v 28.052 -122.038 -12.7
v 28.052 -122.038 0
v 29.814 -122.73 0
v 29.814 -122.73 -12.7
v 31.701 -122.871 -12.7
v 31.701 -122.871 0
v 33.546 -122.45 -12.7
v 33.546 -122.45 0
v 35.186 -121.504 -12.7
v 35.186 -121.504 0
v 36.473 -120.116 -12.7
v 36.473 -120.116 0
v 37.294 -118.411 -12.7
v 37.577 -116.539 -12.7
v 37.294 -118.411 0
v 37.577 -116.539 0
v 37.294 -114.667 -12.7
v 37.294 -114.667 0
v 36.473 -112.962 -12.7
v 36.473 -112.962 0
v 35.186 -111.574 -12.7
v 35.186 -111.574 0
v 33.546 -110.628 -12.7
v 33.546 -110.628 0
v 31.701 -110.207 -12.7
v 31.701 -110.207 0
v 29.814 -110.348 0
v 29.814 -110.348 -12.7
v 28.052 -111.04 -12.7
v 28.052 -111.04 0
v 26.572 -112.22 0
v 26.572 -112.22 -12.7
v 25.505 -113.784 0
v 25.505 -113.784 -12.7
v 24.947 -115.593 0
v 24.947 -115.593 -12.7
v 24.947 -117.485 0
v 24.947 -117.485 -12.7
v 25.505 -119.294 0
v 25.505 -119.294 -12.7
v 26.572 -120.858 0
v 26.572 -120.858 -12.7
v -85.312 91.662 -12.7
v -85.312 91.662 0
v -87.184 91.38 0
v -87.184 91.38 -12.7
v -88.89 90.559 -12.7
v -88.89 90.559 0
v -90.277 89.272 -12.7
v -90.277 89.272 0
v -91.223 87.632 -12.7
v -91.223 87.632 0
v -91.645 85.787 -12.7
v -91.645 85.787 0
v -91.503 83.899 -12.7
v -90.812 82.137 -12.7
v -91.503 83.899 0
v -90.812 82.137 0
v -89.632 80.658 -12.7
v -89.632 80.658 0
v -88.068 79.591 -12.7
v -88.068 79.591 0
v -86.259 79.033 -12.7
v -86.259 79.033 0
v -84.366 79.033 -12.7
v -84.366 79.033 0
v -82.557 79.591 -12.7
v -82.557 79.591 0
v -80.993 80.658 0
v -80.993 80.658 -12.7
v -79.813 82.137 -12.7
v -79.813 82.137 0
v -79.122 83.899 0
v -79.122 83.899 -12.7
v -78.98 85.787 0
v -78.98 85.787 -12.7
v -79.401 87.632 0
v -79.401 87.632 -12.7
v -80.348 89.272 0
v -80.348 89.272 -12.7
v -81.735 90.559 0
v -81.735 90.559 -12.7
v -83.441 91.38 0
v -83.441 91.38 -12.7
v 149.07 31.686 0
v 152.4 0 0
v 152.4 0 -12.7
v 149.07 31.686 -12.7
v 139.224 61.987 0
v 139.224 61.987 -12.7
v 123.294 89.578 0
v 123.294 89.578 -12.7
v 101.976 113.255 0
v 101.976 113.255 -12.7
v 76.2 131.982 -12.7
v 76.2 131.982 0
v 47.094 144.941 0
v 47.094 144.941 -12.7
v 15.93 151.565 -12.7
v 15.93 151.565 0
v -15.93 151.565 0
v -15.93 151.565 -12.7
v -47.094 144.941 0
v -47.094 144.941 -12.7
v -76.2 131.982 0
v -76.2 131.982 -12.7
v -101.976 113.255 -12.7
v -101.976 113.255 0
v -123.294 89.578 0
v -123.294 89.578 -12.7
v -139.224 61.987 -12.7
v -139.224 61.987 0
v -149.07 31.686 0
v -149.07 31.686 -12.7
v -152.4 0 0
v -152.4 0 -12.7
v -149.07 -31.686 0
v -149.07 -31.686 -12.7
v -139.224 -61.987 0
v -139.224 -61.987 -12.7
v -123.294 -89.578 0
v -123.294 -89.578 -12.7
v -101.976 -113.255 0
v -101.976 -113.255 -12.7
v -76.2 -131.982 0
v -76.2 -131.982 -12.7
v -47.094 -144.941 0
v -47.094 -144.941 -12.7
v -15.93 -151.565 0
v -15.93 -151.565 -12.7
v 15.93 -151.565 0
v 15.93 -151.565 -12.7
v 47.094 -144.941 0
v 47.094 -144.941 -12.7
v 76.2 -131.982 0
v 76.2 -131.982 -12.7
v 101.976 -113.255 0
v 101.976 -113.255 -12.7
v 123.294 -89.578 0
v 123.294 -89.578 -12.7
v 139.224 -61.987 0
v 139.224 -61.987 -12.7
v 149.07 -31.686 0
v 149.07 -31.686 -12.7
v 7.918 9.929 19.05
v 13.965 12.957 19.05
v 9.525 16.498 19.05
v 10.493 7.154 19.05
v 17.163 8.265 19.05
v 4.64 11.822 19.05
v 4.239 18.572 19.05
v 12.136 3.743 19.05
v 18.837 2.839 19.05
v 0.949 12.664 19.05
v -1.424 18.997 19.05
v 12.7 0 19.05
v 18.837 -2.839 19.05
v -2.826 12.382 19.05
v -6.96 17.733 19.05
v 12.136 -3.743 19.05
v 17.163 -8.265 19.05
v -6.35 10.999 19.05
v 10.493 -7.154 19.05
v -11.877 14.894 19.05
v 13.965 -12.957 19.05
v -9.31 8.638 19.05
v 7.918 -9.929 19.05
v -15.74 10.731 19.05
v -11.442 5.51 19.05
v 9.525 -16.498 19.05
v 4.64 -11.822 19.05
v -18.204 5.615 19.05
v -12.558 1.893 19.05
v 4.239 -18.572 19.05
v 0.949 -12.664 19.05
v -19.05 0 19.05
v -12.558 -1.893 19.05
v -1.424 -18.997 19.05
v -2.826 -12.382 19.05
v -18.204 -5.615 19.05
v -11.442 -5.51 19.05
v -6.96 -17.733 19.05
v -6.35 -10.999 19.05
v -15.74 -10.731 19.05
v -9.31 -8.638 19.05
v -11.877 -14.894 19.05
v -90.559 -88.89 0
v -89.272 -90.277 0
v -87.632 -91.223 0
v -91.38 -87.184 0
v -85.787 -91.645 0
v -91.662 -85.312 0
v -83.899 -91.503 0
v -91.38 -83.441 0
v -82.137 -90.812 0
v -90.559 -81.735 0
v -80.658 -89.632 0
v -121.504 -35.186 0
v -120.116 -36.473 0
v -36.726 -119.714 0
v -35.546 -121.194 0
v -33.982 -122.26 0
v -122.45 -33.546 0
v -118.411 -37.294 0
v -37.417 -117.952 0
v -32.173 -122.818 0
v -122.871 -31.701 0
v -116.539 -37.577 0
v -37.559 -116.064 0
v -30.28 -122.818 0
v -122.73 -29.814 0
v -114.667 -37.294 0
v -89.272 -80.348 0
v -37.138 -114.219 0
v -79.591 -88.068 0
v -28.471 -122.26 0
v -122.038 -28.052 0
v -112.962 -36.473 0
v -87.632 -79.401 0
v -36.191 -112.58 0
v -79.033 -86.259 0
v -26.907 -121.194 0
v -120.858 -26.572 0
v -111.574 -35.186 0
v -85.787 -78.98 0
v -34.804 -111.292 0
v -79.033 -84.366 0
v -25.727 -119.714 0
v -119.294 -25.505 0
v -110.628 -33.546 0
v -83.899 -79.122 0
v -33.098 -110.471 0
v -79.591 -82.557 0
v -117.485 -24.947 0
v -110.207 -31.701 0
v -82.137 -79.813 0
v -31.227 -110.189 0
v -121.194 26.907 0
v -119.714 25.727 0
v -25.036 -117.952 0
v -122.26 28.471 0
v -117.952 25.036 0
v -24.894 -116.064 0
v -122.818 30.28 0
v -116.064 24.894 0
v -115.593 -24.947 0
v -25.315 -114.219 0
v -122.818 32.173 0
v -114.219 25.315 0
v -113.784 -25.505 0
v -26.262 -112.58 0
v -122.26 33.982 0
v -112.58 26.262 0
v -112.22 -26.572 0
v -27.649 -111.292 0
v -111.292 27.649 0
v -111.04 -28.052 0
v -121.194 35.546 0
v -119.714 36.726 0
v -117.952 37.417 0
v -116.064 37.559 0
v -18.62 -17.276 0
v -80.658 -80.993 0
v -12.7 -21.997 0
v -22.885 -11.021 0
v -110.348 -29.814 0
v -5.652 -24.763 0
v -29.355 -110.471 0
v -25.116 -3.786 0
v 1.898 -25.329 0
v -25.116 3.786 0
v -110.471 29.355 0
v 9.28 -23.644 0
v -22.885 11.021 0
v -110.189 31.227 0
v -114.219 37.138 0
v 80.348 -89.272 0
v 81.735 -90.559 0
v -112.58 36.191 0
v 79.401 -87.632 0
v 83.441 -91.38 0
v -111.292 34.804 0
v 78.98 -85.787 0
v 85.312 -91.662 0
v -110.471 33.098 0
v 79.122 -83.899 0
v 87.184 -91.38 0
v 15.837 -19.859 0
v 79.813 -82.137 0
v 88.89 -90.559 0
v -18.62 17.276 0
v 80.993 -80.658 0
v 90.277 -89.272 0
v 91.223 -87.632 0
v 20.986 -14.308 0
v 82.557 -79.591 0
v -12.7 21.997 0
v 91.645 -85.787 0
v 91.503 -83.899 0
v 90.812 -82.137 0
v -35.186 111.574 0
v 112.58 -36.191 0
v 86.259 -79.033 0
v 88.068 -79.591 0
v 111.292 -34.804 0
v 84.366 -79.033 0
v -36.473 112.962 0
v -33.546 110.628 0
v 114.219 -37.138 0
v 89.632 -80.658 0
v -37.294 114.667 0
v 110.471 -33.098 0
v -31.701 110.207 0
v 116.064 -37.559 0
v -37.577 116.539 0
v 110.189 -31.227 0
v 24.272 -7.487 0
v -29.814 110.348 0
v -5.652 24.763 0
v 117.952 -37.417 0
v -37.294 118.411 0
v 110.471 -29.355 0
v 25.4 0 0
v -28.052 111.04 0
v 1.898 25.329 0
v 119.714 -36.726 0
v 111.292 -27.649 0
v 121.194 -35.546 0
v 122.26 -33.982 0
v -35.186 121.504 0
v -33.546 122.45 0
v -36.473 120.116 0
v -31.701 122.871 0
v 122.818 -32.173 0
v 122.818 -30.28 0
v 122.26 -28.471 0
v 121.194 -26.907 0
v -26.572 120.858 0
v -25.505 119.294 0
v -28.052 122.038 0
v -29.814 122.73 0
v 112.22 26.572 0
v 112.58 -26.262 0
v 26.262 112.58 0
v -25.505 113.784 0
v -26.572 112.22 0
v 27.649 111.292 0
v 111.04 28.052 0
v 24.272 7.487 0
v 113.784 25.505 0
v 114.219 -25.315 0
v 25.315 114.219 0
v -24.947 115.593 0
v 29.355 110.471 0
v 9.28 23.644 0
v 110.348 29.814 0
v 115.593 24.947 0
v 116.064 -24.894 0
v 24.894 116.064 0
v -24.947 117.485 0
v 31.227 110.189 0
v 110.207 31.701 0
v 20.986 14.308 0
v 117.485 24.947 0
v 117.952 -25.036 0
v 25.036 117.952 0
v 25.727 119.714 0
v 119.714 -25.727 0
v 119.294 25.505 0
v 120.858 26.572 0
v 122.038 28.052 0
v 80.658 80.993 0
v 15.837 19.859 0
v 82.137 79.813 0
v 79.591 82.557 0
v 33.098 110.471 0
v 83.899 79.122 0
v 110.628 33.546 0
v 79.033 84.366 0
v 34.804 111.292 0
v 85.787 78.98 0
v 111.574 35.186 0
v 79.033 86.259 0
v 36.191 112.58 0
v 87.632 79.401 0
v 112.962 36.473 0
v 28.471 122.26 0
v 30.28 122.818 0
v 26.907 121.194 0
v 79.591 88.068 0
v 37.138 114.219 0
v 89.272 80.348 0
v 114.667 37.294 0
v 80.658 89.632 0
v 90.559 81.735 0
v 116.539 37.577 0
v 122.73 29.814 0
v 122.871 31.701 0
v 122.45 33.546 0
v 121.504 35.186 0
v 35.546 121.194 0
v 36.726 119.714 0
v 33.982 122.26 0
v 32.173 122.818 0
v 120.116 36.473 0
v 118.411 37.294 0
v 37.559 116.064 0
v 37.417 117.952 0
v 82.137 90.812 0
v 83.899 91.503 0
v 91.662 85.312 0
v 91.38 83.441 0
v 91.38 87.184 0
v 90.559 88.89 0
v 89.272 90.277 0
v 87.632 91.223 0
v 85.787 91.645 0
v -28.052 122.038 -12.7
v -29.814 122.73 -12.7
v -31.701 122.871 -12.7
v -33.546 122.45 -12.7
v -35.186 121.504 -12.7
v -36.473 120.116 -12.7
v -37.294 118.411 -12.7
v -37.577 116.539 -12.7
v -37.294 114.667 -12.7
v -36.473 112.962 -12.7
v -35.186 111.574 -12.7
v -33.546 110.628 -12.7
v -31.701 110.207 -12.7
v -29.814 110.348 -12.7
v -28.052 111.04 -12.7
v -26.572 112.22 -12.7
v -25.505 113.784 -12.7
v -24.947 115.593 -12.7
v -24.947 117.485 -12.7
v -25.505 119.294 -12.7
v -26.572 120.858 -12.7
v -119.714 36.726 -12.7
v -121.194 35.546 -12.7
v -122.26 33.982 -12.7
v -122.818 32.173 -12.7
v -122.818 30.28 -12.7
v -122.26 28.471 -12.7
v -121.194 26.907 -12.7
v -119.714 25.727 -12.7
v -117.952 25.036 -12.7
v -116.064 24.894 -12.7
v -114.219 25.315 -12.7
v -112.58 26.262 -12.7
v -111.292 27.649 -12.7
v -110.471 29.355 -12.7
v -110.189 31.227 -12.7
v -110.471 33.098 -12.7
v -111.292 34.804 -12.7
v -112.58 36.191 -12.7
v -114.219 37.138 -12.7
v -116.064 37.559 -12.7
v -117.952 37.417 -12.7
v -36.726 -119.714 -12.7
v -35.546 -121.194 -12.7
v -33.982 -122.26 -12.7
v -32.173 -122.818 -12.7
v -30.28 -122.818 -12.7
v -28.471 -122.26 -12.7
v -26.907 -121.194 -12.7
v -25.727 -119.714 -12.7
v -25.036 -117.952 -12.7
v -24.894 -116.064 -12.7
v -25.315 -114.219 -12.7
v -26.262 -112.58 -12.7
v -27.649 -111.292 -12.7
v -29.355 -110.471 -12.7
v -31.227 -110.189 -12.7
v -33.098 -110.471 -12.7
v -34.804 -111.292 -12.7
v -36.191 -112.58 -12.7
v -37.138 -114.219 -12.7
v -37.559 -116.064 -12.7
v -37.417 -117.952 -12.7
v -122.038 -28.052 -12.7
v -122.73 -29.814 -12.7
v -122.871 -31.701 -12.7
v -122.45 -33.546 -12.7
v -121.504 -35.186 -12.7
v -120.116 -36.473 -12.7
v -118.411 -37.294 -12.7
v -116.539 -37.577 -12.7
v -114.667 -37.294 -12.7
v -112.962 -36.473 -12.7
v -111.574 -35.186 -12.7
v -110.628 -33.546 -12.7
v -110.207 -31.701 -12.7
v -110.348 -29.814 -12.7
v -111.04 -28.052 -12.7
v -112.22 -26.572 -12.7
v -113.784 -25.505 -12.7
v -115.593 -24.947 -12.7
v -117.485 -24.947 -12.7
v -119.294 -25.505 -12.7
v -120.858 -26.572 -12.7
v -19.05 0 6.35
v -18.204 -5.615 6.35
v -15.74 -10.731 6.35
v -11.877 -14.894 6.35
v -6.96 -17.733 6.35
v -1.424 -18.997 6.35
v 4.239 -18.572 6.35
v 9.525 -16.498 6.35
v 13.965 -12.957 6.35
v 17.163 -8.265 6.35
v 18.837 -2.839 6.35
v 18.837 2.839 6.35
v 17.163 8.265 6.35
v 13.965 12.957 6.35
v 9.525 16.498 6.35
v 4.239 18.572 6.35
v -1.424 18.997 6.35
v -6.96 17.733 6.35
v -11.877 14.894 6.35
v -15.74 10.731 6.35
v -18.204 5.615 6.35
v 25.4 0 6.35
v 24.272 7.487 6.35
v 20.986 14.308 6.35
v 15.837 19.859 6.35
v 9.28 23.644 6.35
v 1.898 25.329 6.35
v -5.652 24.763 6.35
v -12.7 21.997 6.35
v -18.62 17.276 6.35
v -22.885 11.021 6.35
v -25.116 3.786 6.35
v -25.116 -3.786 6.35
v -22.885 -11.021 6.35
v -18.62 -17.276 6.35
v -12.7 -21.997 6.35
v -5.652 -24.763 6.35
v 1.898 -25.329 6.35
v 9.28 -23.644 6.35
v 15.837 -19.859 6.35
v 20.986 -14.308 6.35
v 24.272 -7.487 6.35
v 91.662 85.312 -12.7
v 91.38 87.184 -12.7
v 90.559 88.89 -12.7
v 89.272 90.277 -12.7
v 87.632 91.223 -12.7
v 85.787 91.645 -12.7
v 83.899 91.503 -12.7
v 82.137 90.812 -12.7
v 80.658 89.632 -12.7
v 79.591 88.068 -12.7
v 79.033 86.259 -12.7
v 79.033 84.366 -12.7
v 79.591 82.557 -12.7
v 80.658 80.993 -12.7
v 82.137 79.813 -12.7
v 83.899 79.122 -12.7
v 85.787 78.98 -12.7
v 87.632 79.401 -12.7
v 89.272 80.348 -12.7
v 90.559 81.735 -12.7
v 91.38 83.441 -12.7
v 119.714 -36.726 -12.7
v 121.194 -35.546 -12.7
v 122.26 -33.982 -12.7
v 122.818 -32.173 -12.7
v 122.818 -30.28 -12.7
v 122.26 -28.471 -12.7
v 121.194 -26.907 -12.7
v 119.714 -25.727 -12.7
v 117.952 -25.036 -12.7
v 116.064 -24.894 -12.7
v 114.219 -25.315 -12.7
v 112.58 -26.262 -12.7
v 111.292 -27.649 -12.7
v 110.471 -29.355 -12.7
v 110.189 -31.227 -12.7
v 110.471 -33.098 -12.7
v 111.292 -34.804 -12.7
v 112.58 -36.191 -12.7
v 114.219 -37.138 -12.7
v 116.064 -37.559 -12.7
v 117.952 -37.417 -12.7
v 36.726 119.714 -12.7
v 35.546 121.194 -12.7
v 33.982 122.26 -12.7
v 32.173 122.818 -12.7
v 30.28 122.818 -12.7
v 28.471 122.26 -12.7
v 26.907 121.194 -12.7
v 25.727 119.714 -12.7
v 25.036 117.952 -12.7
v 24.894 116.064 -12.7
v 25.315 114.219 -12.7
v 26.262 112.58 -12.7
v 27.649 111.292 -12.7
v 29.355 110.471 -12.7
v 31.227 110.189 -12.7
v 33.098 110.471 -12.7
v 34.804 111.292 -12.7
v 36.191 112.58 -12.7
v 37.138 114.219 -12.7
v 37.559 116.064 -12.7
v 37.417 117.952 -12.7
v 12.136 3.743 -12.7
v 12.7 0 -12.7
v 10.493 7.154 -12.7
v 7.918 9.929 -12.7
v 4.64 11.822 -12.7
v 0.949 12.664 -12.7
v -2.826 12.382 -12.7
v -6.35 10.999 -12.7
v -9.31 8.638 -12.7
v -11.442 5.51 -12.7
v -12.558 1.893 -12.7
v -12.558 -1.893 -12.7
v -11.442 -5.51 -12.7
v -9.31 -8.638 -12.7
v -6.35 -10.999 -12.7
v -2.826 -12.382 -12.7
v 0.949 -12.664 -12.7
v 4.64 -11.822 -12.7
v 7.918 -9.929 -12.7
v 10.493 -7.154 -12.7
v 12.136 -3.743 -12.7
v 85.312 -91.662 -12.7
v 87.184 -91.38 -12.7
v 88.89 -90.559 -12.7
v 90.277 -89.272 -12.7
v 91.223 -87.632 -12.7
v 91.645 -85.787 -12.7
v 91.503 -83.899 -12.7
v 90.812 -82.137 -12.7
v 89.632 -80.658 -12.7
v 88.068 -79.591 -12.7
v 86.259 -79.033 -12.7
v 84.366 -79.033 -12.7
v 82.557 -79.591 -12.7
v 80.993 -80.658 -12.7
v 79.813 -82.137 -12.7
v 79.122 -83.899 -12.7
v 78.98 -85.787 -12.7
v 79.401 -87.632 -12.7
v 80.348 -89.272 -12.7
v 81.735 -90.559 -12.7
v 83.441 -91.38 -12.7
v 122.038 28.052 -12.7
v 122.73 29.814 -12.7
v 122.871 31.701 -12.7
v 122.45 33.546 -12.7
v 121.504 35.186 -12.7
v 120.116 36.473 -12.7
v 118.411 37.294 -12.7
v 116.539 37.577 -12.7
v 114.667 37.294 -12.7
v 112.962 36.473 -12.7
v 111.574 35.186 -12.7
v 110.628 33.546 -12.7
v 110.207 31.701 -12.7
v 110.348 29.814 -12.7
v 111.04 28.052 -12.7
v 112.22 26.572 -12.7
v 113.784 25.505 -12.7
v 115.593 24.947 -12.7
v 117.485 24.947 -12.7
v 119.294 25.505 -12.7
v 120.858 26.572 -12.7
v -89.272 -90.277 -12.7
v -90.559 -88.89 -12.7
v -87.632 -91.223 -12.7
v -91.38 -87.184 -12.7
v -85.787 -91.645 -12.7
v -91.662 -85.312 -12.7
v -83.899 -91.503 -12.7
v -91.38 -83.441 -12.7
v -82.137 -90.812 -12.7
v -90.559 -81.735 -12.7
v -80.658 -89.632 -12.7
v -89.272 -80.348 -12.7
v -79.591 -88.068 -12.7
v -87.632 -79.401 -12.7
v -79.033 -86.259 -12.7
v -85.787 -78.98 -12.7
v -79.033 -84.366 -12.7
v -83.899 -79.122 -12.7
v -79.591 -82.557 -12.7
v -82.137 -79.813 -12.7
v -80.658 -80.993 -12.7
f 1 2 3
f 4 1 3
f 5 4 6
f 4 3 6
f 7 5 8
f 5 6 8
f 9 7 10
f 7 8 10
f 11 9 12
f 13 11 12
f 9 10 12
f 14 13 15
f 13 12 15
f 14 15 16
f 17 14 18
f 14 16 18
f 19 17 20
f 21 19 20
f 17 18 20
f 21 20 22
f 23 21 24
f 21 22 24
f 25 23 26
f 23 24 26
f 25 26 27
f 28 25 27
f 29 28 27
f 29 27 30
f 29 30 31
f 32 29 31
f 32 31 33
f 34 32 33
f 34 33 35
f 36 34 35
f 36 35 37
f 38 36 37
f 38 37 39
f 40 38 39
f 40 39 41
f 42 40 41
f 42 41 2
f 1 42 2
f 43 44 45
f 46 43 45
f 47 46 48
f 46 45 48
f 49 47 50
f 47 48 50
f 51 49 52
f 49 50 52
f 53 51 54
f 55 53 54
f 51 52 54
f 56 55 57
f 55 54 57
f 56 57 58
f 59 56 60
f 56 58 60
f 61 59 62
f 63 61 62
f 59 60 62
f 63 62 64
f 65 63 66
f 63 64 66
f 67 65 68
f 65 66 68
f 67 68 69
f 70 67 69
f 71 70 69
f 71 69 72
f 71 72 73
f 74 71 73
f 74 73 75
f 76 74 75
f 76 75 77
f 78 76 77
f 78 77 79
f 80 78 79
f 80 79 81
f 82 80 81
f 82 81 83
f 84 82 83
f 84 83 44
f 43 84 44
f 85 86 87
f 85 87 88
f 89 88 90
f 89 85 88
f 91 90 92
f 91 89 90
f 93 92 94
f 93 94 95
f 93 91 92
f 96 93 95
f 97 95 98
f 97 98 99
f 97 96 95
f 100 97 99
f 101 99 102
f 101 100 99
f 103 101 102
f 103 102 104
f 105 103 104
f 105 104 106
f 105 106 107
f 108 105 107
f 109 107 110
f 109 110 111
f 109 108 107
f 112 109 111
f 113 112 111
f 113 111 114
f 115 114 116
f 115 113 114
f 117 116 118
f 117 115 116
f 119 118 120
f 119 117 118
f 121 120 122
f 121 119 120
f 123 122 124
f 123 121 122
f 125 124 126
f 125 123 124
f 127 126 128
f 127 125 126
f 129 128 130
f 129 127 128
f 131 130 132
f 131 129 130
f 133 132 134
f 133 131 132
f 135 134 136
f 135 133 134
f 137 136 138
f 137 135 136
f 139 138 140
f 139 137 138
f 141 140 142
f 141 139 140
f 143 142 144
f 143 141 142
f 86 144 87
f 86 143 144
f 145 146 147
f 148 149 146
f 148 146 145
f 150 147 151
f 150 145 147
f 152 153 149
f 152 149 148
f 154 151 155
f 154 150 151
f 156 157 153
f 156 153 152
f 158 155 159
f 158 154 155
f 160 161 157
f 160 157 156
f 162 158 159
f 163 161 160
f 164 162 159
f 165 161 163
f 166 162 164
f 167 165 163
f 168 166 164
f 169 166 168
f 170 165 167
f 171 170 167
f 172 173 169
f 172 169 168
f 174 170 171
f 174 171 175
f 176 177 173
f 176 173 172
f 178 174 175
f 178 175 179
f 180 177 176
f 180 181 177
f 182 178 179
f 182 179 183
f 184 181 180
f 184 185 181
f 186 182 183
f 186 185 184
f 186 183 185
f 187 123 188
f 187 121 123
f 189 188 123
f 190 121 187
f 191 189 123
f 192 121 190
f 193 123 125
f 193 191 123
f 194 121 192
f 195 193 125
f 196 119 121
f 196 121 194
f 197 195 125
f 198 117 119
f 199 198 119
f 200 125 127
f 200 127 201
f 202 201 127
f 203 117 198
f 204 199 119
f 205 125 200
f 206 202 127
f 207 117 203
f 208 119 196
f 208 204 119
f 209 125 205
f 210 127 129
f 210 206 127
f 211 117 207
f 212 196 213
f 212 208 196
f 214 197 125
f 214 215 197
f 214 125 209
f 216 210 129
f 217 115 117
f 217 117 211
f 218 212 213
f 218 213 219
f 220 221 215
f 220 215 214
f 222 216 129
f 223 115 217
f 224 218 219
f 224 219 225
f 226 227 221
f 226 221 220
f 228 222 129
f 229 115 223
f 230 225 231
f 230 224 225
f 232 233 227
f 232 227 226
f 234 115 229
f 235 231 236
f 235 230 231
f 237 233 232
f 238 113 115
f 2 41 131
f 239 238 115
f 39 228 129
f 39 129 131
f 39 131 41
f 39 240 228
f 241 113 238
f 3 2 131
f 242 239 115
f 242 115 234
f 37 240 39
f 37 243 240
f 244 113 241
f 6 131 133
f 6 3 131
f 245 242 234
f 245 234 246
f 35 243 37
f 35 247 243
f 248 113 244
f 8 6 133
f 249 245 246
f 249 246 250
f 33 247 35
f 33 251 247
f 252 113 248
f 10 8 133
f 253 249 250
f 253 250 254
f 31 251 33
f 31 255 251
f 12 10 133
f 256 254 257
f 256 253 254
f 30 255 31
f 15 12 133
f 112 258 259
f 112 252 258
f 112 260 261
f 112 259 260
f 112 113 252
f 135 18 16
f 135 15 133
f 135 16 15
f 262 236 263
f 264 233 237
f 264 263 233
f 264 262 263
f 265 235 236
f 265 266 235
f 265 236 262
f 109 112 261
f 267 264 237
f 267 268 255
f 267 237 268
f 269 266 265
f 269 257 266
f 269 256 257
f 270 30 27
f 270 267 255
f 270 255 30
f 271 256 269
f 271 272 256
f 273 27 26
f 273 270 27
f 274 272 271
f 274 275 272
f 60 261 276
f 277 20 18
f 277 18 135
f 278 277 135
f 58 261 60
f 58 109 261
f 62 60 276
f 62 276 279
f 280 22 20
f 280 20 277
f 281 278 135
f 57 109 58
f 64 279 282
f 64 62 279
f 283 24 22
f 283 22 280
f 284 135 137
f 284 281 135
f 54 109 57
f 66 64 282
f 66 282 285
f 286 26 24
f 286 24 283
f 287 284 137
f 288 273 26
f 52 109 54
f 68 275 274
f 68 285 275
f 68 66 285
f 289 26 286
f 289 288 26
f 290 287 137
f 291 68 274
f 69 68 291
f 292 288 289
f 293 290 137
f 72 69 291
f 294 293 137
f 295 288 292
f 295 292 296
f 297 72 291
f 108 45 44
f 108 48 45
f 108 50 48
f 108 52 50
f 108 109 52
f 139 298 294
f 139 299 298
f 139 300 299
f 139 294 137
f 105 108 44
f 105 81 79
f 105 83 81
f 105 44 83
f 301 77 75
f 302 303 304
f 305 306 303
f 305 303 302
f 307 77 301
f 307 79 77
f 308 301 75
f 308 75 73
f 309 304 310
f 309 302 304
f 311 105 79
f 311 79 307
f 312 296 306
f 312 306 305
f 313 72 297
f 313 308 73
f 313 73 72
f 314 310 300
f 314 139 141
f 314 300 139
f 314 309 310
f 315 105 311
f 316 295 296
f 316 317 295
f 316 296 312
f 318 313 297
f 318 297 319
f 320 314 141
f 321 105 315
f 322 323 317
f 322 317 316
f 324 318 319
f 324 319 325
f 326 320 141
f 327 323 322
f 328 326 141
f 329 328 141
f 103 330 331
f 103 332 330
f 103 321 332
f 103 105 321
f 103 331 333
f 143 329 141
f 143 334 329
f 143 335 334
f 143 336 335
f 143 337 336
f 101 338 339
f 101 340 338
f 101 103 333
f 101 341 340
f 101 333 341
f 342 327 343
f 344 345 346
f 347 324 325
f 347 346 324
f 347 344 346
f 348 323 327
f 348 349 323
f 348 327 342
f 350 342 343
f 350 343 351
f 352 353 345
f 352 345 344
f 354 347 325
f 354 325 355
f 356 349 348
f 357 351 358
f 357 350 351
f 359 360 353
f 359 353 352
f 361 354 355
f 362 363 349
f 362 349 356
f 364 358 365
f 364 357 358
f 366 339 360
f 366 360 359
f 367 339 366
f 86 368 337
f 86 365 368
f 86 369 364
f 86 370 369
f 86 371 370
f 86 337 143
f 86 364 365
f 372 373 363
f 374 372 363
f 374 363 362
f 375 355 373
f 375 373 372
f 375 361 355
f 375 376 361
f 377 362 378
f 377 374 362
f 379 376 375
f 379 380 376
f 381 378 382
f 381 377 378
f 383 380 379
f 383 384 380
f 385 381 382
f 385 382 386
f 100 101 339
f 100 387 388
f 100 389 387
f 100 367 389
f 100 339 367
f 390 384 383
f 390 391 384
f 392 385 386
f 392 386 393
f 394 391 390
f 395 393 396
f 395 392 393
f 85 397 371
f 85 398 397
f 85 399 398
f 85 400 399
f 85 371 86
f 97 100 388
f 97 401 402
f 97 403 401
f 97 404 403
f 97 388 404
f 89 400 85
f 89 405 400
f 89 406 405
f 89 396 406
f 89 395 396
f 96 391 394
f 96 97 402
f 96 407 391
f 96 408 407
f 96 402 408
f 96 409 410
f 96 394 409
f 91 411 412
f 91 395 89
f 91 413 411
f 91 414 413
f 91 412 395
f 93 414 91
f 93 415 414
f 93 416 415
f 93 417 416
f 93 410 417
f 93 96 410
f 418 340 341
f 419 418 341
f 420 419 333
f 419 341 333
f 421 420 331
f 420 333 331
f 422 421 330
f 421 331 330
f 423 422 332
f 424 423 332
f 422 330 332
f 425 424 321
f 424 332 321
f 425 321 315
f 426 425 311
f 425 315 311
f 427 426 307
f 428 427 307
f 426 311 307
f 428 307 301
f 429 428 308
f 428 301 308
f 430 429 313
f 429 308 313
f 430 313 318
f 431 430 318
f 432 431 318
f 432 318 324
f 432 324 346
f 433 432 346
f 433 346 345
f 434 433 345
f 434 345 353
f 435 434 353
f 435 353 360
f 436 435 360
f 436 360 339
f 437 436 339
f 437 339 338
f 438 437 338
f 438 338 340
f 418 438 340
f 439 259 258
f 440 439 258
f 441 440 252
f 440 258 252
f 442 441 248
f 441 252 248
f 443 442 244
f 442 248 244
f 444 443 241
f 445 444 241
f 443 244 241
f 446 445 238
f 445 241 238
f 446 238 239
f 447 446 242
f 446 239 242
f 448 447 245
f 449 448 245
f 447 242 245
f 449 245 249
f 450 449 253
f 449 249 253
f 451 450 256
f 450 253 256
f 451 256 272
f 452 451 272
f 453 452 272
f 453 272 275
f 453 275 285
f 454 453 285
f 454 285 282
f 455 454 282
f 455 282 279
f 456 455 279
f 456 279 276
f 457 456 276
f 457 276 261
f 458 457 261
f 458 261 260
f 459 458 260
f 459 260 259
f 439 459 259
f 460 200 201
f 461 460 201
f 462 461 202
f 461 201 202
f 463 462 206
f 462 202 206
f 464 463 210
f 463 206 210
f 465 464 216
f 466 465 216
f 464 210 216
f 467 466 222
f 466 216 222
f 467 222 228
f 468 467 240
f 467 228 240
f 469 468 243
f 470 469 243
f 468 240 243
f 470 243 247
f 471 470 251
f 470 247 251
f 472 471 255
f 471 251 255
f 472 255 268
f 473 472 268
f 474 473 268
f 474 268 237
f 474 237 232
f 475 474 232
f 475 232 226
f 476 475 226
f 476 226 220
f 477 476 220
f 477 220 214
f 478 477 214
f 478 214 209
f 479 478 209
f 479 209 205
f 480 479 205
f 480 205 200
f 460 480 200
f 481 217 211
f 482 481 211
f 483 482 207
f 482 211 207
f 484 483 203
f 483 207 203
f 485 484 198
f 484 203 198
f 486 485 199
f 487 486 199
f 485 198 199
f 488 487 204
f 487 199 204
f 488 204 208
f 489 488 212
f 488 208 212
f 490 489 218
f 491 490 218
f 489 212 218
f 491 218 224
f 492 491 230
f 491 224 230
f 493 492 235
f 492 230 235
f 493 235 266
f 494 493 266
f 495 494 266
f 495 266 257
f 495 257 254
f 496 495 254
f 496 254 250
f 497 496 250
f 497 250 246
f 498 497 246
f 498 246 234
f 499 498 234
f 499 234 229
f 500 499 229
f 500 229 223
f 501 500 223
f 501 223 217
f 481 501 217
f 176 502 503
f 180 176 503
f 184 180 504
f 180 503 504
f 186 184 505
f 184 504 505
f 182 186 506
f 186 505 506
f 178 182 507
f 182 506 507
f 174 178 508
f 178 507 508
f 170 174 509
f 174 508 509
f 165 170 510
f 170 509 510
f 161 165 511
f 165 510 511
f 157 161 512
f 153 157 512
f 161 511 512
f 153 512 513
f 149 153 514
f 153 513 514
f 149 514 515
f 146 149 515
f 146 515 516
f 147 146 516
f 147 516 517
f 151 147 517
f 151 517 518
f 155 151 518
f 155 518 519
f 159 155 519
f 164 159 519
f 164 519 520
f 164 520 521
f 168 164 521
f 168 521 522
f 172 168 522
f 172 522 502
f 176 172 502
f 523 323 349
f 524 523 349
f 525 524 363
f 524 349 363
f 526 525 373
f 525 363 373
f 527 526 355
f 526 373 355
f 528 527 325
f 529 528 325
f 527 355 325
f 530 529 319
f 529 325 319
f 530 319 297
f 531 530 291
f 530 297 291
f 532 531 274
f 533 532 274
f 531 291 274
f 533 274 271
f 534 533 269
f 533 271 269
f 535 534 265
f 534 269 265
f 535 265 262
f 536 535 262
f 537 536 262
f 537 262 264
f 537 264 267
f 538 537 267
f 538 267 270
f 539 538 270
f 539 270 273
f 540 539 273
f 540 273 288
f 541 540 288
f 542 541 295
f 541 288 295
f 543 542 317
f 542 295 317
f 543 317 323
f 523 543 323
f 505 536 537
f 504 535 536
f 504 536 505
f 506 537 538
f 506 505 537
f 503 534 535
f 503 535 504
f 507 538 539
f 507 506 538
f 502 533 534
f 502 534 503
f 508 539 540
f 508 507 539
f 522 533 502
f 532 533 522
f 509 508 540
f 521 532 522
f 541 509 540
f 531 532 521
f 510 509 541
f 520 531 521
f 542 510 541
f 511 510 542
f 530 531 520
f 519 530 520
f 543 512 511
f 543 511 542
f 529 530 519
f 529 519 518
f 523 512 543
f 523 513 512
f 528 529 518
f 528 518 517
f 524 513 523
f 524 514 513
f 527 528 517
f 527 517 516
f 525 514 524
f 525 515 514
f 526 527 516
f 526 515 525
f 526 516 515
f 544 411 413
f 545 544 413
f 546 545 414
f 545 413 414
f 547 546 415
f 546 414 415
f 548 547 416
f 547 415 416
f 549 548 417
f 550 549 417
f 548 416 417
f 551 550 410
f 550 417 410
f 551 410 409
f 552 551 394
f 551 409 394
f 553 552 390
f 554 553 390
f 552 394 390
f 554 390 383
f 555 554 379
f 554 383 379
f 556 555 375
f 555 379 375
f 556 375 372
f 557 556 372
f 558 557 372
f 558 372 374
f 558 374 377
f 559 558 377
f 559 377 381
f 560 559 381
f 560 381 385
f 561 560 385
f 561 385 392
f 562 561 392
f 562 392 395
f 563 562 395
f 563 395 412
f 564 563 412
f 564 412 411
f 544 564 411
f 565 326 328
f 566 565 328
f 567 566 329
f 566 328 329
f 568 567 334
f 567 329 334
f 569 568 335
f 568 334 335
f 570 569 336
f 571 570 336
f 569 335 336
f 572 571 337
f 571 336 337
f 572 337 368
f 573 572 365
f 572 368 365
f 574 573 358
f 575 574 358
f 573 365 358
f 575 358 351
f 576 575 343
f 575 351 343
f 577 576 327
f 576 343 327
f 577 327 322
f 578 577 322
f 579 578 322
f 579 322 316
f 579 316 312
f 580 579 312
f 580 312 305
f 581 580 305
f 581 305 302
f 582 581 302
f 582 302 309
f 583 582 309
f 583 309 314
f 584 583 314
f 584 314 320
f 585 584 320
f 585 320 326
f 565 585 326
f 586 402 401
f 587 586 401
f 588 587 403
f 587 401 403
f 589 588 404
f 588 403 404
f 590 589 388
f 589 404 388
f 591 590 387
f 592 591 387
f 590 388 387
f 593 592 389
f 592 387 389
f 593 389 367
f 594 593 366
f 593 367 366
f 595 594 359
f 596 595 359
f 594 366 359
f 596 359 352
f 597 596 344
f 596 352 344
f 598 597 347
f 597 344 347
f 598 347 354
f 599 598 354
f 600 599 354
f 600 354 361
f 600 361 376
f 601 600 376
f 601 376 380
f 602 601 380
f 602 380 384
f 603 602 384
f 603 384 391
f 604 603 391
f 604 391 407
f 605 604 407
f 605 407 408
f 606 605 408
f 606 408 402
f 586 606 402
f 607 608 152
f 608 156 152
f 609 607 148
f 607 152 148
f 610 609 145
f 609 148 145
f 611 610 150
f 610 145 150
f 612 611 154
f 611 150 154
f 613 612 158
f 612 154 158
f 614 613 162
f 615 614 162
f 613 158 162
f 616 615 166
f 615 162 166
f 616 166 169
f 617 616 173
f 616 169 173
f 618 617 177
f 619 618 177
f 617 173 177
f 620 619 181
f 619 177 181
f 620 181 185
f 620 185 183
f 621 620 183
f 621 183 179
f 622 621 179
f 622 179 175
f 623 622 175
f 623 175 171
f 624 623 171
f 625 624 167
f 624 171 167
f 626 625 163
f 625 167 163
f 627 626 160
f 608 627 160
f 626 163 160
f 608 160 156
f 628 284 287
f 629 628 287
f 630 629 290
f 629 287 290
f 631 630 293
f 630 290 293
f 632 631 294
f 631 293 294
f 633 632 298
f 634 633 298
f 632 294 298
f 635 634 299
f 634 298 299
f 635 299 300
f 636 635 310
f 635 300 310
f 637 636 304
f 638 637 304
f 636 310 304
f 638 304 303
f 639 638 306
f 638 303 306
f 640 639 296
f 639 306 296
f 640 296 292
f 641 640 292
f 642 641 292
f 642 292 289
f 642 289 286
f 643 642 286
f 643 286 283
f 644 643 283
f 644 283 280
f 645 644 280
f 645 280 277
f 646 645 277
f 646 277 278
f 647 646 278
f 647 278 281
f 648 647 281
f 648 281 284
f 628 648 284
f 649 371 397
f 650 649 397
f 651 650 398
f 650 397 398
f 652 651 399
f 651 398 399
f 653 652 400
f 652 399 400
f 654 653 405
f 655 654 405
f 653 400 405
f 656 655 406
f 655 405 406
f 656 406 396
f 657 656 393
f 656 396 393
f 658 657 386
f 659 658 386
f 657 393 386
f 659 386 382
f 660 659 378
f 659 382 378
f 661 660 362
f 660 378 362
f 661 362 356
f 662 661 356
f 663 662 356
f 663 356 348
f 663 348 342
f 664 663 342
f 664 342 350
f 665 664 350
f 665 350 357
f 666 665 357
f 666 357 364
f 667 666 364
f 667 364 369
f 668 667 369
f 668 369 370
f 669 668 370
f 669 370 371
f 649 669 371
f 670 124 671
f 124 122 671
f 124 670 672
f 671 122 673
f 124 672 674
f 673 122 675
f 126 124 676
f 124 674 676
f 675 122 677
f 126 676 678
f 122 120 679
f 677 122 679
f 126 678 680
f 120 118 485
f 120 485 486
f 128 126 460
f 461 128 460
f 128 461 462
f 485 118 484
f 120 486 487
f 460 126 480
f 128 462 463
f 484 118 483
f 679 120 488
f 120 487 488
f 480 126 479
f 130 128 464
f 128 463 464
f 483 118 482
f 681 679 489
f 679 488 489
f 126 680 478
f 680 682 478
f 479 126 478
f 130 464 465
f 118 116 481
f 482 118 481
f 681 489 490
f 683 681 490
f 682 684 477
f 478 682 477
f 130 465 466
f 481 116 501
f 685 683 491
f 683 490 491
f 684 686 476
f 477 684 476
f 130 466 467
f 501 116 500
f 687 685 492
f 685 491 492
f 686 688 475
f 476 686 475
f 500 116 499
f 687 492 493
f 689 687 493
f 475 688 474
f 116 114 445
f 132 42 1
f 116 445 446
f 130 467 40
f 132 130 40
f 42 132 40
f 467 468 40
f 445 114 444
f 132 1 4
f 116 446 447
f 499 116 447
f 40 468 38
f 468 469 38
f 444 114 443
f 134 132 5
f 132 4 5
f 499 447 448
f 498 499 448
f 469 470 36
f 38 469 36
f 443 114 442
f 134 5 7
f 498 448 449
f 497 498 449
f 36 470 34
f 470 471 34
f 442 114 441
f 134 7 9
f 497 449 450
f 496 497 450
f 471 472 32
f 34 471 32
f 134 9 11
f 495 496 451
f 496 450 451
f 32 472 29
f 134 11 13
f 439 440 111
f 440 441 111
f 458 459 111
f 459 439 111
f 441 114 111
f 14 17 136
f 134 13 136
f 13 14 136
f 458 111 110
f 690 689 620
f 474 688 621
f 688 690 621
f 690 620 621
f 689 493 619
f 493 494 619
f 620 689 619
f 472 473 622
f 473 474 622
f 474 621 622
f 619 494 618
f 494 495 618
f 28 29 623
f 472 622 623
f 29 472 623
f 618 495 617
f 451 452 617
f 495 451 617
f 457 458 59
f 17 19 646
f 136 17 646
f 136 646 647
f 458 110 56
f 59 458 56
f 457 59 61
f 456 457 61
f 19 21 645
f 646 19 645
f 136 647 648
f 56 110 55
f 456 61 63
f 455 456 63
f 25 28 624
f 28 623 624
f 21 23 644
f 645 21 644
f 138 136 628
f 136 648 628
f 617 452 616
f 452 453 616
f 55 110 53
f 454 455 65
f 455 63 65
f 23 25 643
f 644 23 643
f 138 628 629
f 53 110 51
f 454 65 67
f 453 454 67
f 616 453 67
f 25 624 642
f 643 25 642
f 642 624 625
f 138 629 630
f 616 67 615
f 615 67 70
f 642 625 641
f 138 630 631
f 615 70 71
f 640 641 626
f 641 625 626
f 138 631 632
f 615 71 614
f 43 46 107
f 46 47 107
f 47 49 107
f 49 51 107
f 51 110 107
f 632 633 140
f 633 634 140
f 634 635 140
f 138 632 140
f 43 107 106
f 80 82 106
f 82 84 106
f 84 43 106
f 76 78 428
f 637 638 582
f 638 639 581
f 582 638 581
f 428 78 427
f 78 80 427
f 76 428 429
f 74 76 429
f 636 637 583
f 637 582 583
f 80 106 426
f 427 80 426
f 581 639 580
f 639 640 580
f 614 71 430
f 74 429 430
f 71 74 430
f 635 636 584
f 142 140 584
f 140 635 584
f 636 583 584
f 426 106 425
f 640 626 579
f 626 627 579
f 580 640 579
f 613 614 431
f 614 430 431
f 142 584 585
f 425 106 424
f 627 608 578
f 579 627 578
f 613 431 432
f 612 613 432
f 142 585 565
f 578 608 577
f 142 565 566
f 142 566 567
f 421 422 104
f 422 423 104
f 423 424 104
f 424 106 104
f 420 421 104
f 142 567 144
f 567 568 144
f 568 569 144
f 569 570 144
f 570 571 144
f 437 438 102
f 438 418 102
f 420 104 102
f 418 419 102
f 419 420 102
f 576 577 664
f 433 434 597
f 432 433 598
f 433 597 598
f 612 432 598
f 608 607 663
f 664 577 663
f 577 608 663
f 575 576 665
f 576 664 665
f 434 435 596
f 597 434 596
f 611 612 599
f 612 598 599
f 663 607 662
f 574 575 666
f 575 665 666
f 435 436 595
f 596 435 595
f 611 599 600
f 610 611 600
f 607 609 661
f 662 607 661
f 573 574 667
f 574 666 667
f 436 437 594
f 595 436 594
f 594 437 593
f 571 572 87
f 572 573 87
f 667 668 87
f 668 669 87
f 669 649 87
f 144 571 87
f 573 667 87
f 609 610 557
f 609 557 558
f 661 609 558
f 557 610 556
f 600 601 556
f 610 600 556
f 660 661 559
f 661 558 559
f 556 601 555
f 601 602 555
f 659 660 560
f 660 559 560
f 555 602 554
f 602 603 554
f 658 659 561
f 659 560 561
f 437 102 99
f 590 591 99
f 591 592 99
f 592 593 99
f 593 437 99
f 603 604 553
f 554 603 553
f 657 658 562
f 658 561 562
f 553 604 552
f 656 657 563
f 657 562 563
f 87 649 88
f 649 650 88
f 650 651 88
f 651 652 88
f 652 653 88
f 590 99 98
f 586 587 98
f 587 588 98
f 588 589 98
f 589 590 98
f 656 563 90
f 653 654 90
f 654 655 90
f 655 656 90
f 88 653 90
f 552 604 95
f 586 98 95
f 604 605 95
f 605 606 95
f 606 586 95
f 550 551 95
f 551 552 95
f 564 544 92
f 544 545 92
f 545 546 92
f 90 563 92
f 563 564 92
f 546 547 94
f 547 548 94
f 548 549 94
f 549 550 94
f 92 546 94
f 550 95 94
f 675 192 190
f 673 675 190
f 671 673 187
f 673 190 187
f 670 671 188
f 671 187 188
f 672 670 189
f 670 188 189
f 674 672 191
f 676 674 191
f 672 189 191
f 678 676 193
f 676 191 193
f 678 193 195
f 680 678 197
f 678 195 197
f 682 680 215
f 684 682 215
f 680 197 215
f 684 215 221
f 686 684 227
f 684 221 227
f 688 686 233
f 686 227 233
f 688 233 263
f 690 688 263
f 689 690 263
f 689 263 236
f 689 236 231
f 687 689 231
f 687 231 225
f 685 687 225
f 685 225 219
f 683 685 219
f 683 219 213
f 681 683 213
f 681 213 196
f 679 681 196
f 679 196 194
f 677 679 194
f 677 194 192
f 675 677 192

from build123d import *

# Parameters (mm, degrees)
SKETCH2_R           = 152.4
SKETCH2_R_2         = 12.7
BOSS_EXTRUDE1_DEPTH = 12.7
SKETCH3_R           = 6.35
CUT_EXTRUDE1_DEPTH  = 216.9
CRVPATTERN1_COUNT   = 12
SKETCH5_R           = 19.05
BOSS_EXTRUDE2_DEPTH = 19.05
SKETCH6_R           = 25.4
BOSS_EXTRUDE3_DEPTH = 6.35
SKETCH8_R           = 12.7
CUT_EXTRUDE2_DEPTH  = 218.85220334


with BuildPart() as part:
    # Sketch2 → Boss-Extrude1 (new body)
    with BuildSketch(Plane.XY):
        Circle(SKETCH2_R)
        Circle(SKETCH2_R_2, mode=Mode.SUBTRACT)
    extrude(amount=-BOSS_EXTRUDE1_DEPTH)

    # Sketch3 → Cut-Extrude1 (cut, through all)
    with BuildSketch(Plane.XY):
        with Locations((85.31243315, 85.31243315)):
            Circle(SKETCH3_R)
    cut_extrude1 = extrude(amount=-CUT_EXTRUDE1_DEPTH, mode=Mode.SUBTRACT)

    # CrvPattern1: Cut-Extrude1 ×12 about axis
    crvpattern1_axis = Axis((0, 0, 0), (0, 0, 1))
    for i in range(1, CRVPATTERN1_COUNT):
        add(cut_extrude1.rotate(crvpattern1_axis, i * 360 / CRVPATTERN1_COUNT), mode=Mode.SUBTRACT)

    # Sketch5 → Boss-Extrude2 (add)
    with BuildSketch(Plane.XY):
        with Locations(Location((0, 0, 0), (0, 0, 180))):
            Circle(SKETCH5_R)
    extrude(amount=BOSS_EXTRUDE2_DEPTH)

    # Sketch6 → Boss-Extrude3 (add)
    with BuildSketch(Plane.XY):
        Circle(SKETCH6_R)
    extrude(amount=BOSS_EXTRUDE3_DEPTH)

    # Sketch8 → Cut-Extrude2 (cut, through all)
    with BuildSketch(Plane(origin=(0, 0, -12.7), x_dir=(-1, 0, 0), z_dir=(0, 0, -1))):
        with Locations(Location((0, 0, 0), (0, 0, 180))):
            Circle(SKETCH8_R)
    extrude(amount=-CUT_EXTRUDE2_DEPTH, mode=Mode.SUBTRACT)


solid = part.part
